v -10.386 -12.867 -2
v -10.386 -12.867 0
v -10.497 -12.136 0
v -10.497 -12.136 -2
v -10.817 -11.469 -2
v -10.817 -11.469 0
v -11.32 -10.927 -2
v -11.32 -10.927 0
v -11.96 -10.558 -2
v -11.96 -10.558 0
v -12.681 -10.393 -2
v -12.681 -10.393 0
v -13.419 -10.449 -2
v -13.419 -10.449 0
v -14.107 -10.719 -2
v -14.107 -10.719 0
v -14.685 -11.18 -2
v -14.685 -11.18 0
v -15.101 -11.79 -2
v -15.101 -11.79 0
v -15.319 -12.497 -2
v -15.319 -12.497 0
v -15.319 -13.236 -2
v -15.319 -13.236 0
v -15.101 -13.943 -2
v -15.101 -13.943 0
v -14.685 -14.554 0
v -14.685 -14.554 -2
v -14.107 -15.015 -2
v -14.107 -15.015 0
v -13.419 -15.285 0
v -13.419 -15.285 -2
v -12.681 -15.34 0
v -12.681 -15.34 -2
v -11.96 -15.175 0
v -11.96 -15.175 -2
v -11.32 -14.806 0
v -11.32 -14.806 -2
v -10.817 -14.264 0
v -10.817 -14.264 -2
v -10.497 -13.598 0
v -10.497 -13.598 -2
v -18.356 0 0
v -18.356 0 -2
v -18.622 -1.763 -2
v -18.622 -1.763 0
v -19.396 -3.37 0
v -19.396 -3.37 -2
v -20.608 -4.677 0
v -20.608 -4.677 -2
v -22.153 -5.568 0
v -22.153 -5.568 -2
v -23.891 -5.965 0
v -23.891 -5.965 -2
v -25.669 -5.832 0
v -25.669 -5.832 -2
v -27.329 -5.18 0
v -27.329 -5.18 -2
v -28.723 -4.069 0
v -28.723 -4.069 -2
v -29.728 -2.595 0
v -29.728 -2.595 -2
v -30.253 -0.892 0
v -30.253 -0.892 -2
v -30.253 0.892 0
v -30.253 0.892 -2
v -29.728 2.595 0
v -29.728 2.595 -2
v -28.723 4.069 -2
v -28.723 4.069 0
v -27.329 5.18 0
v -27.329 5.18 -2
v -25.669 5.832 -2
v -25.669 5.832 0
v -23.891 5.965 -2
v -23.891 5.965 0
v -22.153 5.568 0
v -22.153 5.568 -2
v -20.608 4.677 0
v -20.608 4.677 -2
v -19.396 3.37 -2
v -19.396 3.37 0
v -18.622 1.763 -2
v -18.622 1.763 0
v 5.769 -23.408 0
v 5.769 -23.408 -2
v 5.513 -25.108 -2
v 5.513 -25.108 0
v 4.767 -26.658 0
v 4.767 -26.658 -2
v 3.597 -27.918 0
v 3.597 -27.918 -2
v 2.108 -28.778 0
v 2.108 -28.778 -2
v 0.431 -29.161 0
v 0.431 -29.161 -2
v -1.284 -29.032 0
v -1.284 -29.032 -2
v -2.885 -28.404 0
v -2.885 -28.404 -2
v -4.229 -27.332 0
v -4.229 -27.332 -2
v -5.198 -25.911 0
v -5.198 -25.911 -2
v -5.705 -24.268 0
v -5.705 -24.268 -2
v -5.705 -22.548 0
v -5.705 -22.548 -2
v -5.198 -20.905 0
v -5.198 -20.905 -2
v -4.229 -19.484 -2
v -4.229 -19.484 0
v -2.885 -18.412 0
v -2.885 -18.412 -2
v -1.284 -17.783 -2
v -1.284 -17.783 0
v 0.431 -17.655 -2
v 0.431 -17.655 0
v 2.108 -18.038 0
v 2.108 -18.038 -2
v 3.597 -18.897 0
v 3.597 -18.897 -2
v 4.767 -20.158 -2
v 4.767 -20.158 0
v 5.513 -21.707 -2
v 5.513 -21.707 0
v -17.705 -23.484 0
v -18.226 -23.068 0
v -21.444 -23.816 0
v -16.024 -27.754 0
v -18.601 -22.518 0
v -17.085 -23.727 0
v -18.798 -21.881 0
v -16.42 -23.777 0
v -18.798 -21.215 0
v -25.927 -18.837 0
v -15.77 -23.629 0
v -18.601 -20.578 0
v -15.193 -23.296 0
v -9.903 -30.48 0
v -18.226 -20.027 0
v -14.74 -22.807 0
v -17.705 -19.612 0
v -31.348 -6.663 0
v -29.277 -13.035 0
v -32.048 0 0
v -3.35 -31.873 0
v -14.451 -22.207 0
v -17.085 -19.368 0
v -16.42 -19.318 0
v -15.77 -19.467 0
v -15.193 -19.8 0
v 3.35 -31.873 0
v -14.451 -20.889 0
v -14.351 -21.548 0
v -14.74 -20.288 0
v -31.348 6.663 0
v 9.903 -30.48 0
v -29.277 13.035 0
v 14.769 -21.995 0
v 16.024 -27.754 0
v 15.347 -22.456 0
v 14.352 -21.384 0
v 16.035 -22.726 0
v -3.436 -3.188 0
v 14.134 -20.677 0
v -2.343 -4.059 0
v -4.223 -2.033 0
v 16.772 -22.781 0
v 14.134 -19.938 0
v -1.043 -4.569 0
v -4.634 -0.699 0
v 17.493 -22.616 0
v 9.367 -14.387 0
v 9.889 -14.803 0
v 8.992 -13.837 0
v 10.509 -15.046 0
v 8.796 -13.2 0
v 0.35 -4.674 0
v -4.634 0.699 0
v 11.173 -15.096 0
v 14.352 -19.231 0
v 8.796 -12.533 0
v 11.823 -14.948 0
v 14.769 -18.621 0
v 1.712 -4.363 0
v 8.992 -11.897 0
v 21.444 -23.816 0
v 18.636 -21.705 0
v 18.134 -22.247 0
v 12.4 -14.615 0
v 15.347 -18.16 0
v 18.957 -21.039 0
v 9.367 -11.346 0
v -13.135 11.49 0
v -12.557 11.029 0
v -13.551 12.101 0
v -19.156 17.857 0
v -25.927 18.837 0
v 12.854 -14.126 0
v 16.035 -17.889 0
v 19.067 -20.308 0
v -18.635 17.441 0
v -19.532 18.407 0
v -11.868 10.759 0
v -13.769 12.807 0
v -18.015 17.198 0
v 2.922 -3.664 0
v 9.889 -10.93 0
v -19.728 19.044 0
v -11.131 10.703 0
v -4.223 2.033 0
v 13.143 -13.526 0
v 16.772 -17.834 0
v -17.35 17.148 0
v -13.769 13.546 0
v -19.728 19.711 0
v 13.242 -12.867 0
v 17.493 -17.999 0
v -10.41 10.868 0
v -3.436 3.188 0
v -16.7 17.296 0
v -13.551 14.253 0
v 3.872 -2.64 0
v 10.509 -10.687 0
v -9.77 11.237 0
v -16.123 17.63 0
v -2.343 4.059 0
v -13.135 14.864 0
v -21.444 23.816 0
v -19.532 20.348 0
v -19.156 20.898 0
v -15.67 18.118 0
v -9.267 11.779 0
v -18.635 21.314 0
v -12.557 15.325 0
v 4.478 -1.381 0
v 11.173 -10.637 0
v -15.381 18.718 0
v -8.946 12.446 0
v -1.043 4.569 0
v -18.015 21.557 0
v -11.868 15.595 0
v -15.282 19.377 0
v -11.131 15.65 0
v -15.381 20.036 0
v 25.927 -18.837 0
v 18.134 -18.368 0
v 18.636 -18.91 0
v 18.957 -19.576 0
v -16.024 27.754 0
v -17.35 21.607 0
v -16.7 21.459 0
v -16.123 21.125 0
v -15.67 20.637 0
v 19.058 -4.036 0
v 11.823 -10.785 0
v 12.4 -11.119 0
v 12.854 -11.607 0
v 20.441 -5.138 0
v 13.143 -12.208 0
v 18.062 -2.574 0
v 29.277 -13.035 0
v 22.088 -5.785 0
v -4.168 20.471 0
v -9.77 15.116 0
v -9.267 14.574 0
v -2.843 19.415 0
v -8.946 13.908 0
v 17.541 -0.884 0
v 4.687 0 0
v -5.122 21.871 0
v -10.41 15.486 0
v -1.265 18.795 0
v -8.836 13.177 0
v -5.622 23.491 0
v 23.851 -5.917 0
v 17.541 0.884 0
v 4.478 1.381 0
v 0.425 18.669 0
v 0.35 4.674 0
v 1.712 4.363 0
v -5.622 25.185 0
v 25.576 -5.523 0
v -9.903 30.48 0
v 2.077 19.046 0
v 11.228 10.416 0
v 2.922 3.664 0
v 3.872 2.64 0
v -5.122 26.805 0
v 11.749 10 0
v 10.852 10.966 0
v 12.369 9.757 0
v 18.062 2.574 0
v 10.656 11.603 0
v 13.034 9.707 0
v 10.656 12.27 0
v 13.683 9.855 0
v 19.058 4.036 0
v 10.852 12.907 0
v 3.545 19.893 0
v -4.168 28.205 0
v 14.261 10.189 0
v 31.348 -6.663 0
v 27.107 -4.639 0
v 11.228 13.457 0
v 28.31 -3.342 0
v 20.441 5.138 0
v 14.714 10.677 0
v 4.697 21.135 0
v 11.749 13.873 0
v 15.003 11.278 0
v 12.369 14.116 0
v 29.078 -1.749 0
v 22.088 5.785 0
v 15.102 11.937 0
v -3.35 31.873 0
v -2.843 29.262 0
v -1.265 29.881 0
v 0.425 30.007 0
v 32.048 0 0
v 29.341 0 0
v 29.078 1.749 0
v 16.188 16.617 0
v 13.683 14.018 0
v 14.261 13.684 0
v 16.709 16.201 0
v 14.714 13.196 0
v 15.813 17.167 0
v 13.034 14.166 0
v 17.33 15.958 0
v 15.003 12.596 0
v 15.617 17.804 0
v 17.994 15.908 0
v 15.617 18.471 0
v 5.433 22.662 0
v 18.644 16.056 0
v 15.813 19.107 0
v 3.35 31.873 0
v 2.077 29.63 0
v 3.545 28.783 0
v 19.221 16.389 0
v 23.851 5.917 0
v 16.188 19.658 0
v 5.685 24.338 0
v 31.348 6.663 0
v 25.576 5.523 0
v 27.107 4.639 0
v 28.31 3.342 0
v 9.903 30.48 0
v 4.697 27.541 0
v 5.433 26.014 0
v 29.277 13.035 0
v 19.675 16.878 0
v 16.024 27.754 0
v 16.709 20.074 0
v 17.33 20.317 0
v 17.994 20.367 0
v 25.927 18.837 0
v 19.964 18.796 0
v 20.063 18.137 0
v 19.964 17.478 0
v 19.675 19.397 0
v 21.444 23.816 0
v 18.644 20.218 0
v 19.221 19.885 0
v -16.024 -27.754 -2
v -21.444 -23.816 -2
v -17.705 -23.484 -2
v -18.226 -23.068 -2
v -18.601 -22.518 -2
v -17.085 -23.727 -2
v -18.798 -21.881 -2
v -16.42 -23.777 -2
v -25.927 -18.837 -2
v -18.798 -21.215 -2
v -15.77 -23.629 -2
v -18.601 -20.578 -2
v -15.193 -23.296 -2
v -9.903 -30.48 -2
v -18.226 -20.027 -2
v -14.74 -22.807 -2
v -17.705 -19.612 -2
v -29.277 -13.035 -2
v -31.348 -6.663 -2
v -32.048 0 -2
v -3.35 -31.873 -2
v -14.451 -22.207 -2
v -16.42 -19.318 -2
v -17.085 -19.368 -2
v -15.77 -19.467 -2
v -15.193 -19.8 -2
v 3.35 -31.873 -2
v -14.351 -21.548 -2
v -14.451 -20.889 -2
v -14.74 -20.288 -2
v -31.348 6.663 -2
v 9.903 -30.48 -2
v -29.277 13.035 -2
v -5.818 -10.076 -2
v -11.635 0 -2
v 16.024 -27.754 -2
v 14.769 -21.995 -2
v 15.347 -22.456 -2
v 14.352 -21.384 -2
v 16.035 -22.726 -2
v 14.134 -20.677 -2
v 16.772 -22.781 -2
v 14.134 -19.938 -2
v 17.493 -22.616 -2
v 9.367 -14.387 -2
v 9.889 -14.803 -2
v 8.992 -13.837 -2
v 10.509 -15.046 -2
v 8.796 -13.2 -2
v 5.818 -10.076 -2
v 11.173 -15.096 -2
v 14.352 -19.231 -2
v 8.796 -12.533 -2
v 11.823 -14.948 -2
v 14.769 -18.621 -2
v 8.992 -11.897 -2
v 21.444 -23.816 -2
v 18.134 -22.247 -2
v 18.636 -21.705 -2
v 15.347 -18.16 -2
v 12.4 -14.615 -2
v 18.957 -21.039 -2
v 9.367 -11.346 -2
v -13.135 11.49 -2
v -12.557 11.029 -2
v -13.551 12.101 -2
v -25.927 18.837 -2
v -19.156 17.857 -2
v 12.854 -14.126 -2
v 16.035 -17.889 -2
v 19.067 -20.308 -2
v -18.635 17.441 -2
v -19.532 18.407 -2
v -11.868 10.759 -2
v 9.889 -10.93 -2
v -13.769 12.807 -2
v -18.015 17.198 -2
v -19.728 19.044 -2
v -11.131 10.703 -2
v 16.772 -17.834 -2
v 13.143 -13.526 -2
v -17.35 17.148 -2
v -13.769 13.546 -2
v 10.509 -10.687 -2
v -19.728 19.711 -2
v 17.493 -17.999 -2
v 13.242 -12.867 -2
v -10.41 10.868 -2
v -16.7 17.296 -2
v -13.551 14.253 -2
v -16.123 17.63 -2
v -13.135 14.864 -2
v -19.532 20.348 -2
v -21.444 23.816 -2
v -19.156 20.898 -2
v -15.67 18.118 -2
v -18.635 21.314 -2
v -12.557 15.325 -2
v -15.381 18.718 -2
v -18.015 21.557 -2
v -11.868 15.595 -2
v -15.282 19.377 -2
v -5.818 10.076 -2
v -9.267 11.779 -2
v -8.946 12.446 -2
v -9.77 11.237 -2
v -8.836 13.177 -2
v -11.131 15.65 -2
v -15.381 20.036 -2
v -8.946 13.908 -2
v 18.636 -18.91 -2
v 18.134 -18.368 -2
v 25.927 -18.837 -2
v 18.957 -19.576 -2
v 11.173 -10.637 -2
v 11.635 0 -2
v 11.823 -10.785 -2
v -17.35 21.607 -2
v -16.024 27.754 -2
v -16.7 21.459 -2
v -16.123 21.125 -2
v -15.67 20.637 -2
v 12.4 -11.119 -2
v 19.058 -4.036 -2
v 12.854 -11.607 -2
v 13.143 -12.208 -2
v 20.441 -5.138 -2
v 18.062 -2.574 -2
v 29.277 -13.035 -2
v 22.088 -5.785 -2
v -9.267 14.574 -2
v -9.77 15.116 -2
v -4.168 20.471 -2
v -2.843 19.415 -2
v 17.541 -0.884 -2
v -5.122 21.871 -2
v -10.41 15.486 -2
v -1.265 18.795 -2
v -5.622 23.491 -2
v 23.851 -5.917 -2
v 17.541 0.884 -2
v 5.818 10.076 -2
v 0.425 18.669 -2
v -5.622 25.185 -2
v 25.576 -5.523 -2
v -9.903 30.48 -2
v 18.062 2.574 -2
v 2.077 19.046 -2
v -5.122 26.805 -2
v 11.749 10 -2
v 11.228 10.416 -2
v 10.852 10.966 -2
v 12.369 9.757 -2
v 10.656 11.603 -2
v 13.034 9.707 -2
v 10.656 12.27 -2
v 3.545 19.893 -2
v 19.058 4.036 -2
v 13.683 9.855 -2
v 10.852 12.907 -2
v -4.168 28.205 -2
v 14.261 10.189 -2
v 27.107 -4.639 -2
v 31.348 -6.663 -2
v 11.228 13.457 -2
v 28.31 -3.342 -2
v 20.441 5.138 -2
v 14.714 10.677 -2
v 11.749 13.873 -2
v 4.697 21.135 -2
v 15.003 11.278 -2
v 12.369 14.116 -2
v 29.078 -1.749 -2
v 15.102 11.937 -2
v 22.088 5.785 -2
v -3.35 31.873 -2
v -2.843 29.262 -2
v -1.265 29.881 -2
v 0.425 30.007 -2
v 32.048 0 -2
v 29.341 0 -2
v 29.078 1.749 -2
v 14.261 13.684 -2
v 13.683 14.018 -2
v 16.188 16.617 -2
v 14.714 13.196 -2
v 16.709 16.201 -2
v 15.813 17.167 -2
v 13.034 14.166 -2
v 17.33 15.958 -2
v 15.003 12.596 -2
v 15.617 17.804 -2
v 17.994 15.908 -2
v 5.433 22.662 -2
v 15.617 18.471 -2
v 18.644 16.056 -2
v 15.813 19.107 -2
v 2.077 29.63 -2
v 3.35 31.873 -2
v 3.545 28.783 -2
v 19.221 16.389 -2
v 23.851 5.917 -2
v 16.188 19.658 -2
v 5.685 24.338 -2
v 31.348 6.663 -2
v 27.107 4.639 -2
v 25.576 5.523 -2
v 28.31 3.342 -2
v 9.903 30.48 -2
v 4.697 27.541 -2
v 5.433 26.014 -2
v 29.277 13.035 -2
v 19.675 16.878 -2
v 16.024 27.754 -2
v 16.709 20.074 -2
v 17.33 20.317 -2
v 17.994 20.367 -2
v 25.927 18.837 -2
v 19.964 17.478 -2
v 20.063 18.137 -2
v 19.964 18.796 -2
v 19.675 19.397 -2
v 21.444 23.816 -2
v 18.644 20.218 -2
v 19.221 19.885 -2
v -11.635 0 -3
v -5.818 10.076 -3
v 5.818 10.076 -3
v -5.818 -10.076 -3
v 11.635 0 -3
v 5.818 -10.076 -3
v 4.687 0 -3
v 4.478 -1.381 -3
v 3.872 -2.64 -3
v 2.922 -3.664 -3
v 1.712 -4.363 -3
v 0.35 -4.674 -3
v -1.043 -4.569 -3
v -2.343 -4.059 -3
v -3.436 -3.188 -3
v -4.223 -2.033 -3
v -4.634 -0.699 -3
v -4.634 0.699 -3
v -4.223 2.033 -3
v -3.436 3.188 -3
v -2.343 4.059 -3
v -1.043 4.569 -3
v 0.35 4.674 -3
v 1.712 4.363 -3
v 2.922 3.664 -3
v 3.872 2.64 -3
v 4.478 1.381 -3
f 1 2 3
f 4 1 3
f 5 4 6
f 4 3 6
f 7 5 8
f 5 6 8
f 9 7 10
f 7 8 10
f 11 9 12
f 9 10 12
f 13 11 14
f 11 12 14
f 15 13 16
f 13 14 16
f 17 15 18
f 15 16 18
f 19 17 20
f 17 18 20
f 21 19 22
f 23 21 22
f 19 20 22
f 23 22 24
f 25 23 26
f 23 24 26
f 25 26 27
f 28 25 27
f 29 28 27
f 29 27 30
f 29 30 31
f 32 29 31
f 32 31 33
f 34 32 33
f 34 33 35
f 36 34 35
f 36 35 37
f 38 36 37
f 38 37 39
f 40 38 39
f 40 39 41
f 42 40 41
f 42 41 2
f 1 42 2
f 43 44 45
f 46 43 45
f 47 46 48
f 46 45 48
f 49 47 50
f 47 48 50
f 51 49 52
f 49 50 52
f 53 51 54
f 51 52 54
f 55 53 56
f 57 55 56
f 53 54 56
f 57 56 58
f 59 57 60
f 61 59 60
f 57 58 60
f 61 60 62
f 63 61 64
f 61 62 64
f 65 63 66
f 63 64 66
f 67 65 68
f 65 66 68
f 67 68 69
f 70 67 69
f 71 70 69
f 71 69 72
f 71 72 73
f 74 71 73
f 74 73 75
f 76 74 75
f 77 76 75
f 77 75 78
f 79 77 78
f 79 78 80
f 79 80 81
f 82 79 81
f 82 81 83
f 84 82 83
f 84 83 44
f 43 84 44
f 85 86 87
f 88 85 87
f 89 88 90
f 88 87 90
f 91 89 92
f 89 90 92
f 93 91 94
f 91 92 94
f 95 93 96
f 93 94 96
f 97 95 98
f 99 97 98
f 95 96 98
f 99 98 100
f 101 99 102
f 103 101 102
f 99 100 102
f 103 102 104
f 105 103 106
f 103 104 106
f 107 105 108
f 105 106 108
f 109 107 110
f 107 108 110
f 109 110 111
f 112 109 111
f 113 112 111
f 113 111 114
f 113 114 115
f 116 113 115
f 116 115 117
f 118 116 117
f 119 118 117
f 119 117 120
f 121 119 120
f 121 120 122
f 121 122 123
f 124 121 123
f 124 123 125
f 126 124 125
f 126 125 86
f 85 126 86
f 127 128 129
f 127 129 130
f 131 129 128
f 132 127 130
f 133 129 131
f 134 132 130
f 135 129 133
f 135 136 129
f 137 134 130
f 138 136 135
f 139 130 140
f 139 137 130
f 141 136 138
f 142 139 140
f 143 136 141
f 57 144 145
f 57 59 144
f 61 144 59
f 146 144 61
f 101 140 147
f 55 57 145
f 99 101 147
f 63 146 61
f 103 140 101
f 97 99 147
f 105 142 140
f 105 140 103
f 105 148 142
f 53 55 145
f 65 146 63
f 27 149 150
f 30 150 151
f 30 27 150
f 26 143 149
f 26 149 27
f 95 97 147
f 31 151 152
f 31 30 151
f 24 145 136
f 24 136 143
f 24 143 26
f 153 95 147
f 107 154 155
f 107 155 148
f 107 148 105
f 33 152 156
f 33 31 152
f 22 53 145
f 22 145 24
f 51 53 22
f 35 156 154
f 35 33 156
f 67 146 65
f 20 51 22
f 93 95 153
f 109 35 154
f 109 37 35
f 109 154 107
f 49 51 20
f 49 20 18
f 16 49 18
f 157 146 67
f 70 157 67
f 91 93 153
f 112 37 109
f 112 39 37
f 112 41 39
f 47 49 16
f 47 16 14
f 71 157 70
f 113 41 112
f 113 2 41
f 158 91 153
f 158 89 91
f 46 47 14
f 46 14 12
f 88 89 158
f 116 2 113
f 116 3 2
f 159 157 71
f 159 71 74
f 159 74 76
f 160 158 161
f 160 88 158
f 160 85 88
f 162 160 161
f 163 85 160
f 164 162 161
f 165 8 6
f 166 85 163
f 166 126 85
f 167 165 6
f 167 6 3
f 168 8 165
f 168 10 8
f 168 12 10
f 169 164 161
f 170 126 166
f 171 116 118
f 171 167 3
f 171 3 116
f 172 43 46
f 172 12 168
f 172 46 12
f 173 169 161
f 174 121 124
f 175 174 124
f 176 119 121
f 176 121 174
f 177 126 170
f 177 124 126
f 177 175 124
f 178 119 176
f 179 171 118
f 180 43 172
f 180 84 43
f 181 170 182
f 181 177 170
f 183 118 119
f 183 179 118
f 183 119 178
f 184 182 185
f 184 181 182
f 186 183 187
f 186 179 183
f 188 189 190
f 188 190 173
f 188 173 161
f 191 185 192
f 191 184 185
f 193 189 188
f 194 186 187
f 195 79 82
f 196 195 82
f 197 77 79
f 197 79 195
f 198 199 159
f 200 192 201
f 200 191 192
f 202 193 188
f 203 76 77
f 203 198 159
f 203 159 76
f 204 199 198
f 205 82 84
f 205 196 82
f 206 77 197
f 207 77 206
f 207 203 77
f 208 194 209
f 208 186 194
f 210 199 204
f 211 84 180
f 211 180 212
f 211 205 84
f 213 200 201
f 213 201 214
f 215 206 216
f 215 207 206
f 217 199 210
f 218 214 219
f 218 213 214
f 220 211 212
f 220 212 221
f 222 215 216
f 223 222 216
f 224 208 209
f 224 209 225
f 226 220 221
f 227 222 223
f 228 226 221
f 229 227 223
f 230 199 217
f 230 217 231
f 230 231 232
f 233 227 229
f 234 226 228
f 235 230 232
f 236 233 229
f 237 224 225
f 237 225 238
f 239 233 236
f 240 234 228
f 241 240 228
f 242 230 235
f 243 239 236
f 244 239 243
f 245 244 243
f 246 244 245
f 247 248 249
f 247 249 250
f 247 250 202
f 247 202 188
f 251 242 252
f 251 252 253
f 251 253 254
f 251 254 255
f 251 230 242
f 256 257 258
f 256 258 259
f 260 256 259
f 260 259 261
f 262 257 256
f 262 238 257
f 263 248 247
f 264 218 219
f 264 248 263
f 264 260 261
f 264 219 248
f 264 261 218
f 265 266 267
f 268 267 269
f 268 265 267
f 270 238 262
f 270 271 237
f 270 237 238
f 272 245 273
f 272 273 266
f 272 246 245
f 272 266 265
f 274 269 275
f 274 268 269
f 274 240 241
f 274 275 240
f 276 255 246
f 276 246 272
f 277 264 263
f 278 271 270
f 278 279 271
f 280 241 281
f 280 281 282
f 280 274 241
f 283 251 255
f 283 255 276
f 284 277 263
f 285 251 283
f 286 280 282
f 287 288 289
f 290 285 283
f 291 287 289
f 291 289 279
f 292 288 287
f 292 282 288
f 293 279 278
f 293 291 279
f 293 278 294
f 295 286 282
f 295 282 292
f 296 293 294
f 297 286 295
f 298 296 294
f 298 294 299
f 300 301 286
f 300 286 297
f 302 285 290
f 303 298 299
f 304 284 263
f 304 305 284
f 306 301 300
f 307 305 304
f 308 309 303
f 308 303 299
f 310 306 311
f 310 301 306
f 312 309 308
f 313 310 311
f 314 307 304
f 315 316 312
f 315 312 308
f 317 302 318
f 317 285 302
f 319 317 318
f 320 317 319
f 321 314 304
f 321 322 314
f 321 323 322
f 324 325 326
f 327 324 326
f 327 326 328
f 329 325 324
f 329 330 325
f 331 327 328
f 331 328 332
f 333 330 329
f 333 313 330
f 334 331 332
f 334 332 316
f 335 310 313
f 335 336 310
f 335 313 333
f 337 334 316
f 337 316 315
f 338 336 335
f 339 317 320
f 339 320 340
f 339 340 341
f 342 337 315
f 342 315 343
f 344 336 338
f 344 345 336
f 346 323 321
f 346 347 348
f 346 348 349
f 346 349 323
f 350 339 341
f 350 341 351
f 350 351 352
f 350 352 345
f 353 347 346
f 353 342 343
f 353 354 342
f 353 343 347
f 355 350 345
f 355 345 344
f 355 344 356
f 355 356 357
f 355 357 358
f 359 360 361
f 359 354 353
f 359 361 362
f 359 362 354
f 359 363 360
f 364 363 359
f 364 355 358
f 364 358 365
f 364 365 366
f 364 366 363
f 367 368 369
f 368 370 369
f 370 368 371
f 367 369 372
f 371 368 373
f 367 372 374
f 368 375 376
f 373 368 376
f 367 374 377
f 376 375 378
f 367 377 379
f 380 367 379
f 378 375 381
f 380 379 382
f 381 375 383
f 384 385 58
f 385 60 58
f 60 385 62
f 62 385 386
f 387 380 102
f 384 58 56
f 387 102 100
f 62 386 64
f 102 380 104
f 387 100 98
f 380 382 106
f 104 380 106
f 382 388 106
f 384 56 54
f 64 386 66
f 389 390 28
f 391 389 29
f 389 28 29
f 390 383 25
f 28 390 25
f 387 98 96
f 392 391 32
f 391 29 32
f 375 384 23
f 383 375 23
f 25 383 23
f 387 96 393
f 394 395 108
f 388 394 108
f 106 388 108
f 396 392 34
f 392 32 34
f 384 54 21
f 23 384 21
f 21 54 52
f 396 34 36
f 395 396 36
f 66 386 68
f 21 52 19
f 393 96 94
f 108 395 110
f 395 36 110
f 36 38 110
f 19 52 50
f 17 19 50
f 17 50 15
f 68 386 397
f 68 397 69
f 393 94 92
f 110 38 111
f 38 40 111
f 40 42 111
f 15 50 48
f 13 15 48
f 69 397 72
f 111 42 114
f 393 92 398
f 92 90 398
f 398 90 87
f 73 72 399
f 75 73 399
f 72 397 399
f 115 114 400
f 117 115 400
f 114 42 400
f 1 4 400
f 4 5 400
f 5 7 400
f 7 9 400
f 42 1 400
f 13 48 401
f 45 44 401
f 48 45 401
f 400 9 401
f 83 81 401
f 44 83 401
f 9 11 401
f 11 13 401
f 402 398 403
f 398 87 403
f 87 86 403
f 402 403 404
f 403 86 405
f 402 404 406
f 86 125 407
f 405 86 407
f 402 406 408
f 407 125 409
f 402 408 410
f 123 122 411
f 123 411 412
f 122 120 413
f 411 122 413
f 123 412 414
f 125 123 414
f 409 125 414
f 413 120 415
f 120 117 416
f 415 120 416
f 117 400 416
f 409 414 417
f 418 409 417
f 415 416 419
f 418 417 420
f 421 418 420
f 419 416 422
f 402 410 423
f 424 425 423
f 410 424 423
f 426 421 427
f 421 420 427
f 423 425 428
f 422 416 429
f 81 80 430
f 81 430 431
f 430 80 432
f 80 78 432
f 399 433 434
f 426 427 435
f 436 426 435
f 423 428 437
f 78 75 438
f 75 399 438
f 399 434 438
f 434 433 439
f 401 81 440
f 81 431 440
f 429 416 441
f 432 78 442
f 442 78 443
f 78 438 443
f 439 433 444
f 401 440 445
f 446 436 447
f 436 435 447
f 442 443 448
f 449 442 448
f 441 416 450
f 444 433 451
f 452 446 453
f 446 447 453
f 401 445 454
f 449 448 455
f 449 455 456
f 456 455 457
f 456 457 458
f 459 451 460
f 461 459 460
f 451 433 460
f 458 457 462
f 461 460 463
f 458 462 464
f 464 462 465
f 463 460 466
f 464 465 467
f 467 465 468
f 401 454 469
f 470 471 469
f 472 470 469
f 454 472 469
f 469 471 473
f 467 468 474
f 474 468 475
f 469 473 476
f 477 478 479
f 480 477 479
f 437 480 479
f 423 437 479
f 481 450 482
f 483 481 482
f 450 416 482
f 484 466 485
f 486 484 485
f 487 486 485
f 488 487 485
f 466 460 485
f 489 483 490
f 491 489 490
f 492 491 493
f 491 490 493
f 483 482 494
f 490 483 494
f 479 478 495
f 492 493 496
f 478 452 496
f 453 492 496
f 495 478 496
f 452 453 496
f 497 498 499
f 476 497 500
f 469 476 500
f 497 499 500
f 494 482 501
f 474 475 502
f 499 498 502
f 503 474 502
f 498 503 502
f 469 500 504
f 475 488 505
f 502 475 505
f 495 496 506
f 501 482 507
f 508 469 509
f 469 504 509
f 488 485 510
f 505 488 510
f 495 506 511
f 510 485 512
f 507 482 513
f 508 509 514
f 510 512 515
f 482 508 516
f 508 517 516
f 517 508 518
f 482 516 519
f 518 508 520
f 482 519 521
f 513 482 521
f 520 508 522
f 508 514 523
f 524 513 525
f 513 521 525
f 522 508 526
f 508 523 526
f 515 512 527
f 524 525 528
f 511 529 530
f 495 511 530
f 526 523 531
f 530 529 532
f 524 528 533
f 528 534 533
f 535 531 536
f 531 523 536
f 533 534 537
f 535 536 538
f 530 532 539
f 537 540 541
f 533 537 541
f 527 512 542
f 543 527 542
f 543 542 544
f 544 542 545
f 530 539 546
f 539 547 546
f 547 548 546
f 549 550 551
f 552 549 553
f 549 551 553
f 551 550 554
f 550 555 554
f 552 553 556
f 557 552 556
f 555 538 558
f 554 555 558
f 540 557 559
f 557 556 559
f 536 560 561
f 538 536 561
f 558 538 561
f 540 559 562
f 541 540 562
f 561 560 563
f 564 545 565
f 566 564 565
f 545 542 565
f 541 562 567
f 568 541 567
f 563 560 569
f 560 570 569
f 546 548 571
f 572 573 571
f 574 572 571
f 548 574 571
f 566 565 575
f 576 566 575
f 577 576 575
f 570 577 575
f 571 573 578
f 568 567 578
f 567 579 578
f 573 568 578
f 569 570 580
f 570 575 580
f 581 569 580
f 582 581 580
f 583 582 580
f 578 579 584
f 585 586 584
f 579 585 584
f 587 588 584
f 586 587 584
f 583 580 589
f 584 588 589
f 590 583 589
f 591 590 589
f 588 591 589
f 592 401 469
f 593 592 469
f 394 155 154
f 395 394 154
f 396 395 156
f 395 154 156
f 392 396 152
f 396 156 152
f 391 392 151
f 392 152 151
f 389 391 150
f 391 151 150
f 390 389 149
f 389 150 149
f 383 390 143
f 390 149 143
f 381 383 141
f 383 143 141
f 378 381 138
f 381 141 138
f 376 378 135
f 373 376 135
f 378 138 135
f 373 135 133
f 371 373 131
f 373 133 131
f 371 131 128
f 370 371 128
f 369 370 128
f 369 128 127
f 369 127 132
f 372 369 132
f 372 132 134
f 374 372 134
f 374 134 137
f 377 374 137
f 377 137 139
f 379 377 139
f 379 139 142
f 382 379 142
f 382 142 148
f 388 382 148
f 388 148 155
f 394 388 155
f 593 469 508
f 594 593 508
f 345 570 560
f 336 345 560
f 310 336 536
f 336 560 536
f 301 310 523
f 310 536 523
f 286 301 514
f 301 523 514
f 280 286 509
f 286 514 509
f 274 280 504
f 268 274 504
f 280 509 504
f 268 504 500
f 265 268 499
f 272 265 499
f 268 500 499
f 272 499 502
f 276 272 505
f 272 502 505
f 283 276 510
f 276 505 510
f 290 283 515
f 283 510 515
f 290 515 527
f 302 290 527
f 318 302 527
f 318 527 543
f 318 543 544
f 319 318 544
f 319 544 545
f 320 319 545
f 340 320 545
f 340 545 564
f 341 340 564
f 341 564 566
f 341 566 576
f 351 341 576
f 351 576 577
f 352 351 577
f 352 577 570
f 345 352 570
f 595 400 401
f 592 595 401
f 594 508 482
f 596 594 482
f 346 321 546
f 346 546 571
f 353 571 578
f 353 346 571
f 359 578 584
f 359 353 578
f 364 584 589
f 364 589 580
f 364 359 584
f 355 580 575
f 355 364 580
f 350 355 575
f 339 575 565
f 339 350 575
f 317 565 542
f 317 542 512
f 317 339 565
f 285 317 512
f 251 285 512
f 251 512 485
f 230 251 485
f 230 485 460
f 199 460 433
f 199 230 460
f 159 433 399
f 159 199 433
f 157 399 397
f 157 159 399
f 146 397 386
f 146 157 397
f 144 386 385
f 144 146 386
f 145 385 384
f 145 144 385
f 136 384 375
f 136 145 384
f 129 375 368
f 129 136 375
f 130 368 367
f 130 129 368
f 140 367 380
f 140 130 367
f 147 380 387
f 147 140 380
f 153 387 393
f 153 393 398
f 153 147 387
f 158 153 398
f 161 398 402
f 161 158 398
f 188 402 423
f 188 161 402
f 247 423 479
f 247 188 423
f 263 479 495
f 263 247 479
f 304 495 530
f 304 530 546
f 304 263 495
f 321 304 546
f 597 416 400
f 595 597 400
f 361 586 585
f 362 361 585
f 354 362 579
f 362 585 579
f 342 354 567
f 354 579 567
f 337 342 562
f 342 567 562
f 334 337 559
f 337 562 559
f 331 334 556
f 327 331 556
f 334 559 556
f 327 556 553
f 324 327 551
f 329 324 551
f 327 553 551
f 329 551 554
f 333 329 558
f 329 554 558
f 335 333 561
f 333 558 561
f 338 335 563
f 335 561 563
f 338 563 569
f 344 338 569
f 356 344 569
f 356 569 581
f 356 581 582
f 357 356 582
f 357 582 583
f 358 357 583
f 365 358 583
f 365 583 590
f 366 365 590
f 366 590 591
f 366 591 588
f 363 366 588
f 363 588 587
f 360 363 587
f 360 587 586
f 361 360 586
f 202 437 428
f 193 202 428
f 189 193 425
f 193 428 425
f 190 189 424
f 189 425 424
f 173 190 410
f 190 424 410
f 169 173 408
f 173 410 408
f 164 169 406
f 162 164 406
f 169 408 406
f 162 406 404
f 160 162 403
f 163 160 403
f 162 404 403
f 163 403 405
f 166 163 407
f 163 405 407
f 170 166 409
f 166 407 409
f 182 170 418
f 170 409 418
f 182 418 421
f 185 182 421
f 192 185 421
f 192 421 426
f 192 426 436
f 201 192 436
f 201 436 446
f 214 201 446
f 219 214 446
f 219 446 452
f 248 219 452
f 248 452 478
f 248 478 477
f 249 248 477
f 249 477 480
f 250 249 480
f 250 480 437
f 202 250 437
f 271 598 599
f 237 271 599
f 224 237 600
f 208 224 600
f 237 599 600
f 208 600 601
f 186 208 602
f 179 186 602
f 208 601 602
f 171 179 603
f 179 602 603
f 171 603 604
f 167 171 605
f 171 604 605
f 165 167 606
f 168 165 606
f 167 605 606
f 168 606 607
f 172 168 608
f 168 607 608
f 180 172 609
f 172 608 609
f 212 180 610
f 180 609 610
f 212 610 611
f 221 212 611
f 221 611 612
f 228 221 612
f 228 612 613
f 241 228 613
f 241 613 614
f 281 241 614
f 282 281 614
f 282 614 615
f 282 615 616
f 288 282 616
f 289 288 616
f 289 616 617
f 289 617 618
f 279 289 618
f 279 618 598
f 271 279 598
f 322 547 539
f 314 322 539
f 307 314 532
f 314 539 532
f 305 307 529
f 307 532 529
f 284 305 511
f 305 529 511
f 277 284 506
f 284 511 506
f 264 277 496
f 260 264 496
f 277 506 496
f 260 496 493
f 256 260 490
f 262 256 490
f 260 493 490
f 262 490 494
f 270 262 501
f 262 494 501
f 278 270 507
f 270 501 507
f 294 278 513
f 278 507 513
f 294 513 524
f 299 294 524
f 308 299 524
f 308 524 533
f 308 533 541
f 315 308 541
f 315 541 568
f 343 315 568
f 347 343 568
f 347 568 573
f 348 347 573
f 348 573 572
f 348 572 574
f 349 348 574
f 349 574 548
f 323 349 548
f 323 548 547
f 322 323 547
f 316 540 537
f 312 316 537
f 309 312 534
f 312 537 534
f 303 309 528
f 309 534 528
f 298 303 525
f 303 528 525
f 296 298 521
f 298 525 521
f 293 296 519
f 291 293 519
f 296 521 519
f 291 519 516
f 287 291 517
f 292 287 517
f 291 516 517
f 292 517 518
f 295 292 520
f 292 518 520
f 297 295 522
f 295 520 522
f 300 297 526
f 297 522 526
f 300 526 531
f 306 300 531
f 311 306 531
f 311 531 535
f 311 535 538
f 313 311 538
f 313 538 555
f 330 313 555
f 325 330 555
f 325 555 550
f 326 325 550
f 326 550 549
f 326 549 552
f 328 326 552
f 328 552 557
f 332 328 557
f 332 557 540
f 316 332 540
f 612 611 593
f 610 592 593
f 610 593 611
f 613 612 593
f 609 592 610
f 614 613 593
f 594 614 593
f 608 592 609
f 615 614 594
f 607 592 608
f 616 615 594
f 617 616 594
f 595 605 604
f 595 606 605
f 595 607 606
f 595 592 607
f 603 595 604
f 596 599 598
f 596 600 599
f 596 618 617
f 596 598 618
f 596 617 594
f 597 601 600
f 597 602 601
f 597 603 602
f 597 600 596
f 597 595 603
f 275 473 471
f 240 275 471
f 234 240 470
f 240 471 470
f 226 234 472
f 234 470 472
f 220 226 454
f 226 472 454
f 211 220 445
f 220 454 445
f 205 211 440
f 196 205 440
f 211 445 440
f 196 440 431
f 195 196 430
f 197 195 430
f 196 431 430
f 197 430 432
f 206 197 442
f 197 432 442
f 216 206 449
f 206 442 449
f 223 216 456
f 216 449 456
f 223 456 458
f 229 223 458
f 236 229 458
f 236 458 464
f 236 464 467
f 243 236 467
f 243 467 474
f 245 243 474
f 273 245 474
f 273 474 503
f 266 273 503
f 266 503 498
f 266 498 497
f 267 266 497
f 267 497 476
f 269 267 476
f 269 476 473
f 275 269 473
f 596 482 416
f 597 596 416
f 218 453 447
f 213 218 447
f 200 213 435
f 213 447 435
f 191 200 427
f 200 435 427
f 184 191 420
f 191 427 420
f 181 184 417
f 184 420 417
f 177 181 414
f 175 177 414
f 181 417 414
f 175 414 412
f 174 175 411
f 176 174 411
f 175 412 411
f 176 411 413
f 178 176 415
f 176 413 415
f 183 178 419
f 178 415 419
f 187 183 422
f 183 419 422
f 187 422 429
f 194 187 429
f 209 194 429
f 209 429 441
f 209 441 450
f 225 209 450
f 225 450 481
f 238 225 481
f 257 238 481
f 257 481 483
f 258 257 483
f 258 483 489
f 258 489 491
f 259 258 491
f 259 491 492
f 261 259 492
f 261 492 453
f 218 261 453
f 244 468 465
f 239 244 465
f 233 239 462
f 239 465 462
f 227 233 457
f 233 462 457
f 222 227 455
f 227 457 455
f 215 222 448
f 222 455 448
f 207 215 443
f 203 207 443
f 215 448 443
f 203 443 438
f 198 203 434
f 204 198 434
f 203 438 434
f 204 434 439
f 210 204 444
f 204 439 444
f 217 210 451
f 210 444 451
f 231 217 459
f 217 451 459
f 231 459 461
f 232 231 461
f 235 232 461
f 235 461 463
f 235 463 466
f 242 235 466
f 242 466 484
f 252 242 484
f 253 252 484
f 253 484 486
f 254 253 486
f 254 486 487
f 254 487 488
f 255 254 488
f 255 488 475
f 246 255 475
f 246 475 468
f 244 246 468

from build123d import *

# Parameters (mm, degrees)
F0_R      = 32.048134
F1_DEPTH  = 2
F2_R      = 5.685229
F3_DEPTH  = 25
F4_R      = 5.933428
F5_DEPTH  = 25
F6_R      = 5.76915
F7_DEPTH  = 25
F8_R      = 5.981832
F9_DEPTH  = 25
F11_DEPTH = 1
F12_R     = 4.686623
F13_DEPTH = 25
F14_R     = 2.480316
F14_R_2   = 2.235724
F15_DEPTH = 25
F16_R     = 2.235725
F16_R_2   = 2.235727
F17_DEPTH = 25
F18_R     = 2.235725
F18_R_2   = 2.480314
F19_DEPTH = 25
F20_R     = 2.480316
F20_R_2   = 2.235727
F21_DEPTH = 25


with BuildPart() as f1:
    # F0 (on Top) → F1 (new body)
    with BuildSketch(Plane.XY):
        Circle(F0_R)
    extrude(amount=-F1_DEPTH)

    # F2 (on face) → F3 (cut)
    with BuildSketch(Plane(origin=(0, 0, -2), x_dir=(1, 0, 0), z_dir=(0, 0, -1))):
        with Locations((0, -24.338091)):
            Circle(F2_R)
    extrude(amount=-F3_DEPTH, mode=Mode.SUBTRACT)

    # F4 (on face) → F5 (cut)
    with BuildSketch(Plane(origin=(0, 0, -2), x_dir=(1, 0, 0), z_dir=(0, 0, -1))):
        with Locations((23.407973, 0)):
            Circle(F4_R)
    extrude(amount=-F5_DEPTH, mode=Mode.SUBTRACT)

    # F6 (on face) → F7 (cut)
    with BuildSketch(Plane(origin=(0, 0, -2), x_dir=(1, 0, 0), z_dir=(0, 0, -1))):
        with Locations((0, 23.407973)):
            Circle(F6_R)
    extrude(amount=-F7_DEPTH, mode=Mode.SUBTRACT)

    # F8 (on face) → F9 (cut)
    with BuildSketch(Plane(origin=(0, 0, -2), x_dir=(1, 0, 0), z_dir=(0, 0, -1))):
        with Locations((-24.338093, 0)):
            Circle(F8_R)
    extrude(amount=-F9_DEPTH, mode=Mode.SUBTRACT)

    # F10 (on face) → F11 (join)
    with BuildSketch(Plane(origin=(0, 0, -2), x_dir=(1, 0, 0), z_dir=(0, 0, -1))):
        Polygon((-5.817543, -10.07628), (5.817543, -10.07628), (11.635086, 0), (5.817543, 10.07628), (-5.817543, 10.07628), (-11.635086, 0), align=None)
    extrude(amount=F11_DEPTH)

    # F12 (on face) → F13 (cut)
    with BuildSketch(Plane(origin=(0, 0, -3), x_dir=(1, 0, 0), z_dir=(0, 0, -1))):
        Circle(F12_R)
    extrude(amount=-F13_DEPTH, mode=Mode.SUBTRACT)

    # F14 (on face) → F15 (cut)
    with BuildSketch(Plane(origin=(0, 0, -2), x_dir=(1, 0, 0), z_dir=(0, 0, -1))):
        with Locations((-11.316436, -13.176673)):
            Circle(F14_R)
        with Locations((-17.517224, -19.377461)):
            Circle(F14_R_2)
    extrude(amount=-F15_DEPTH, mode=Mode.SUBTRACT)

    # F16 (on face) → F17 (cut)
    with BuildSketch(Plane(origin=(0, 0, -2), x_dir=(1, 0, 0), z_dir=(0, 0, -1))):
        with Locations((12.866635, -11.936517)):
            Circle(F16_R)
        with Locations((17.827265, -18.137304)):
            Circle(F16_R_2)
    extrude(amount=-F17_DEPTH, mode=Mode.SUBTRACT)

    # F18 (on face) → F19 (cut)
    with BuildSketch(Plane(origin=(0, 0, -2), x_dir=(1, 0, 0), z_dir=(0, 0, -1))):
        with Locations((11.006399, 12.866634)):
            Circle(F18_R)
        with Locations((16.587107, 20.30758)):
            Circle(F18_R_2)
    extrude(amount=-F19_DEPTH, mode=Mode.SUBTRACT)

    # F20 (on Top) → F21 (cut)
    with BuildSketch(Plane.XY):
        with Locations((-12.866635, -12.866634)):
            Circle(F20_R)
        with Locations((-16.587107, -21.547737)):
            Circle(F20_R_2)
    extrude(amount=-F21_DEPTH, mode=Mode.SUBTRACT)


solid = f1.part
